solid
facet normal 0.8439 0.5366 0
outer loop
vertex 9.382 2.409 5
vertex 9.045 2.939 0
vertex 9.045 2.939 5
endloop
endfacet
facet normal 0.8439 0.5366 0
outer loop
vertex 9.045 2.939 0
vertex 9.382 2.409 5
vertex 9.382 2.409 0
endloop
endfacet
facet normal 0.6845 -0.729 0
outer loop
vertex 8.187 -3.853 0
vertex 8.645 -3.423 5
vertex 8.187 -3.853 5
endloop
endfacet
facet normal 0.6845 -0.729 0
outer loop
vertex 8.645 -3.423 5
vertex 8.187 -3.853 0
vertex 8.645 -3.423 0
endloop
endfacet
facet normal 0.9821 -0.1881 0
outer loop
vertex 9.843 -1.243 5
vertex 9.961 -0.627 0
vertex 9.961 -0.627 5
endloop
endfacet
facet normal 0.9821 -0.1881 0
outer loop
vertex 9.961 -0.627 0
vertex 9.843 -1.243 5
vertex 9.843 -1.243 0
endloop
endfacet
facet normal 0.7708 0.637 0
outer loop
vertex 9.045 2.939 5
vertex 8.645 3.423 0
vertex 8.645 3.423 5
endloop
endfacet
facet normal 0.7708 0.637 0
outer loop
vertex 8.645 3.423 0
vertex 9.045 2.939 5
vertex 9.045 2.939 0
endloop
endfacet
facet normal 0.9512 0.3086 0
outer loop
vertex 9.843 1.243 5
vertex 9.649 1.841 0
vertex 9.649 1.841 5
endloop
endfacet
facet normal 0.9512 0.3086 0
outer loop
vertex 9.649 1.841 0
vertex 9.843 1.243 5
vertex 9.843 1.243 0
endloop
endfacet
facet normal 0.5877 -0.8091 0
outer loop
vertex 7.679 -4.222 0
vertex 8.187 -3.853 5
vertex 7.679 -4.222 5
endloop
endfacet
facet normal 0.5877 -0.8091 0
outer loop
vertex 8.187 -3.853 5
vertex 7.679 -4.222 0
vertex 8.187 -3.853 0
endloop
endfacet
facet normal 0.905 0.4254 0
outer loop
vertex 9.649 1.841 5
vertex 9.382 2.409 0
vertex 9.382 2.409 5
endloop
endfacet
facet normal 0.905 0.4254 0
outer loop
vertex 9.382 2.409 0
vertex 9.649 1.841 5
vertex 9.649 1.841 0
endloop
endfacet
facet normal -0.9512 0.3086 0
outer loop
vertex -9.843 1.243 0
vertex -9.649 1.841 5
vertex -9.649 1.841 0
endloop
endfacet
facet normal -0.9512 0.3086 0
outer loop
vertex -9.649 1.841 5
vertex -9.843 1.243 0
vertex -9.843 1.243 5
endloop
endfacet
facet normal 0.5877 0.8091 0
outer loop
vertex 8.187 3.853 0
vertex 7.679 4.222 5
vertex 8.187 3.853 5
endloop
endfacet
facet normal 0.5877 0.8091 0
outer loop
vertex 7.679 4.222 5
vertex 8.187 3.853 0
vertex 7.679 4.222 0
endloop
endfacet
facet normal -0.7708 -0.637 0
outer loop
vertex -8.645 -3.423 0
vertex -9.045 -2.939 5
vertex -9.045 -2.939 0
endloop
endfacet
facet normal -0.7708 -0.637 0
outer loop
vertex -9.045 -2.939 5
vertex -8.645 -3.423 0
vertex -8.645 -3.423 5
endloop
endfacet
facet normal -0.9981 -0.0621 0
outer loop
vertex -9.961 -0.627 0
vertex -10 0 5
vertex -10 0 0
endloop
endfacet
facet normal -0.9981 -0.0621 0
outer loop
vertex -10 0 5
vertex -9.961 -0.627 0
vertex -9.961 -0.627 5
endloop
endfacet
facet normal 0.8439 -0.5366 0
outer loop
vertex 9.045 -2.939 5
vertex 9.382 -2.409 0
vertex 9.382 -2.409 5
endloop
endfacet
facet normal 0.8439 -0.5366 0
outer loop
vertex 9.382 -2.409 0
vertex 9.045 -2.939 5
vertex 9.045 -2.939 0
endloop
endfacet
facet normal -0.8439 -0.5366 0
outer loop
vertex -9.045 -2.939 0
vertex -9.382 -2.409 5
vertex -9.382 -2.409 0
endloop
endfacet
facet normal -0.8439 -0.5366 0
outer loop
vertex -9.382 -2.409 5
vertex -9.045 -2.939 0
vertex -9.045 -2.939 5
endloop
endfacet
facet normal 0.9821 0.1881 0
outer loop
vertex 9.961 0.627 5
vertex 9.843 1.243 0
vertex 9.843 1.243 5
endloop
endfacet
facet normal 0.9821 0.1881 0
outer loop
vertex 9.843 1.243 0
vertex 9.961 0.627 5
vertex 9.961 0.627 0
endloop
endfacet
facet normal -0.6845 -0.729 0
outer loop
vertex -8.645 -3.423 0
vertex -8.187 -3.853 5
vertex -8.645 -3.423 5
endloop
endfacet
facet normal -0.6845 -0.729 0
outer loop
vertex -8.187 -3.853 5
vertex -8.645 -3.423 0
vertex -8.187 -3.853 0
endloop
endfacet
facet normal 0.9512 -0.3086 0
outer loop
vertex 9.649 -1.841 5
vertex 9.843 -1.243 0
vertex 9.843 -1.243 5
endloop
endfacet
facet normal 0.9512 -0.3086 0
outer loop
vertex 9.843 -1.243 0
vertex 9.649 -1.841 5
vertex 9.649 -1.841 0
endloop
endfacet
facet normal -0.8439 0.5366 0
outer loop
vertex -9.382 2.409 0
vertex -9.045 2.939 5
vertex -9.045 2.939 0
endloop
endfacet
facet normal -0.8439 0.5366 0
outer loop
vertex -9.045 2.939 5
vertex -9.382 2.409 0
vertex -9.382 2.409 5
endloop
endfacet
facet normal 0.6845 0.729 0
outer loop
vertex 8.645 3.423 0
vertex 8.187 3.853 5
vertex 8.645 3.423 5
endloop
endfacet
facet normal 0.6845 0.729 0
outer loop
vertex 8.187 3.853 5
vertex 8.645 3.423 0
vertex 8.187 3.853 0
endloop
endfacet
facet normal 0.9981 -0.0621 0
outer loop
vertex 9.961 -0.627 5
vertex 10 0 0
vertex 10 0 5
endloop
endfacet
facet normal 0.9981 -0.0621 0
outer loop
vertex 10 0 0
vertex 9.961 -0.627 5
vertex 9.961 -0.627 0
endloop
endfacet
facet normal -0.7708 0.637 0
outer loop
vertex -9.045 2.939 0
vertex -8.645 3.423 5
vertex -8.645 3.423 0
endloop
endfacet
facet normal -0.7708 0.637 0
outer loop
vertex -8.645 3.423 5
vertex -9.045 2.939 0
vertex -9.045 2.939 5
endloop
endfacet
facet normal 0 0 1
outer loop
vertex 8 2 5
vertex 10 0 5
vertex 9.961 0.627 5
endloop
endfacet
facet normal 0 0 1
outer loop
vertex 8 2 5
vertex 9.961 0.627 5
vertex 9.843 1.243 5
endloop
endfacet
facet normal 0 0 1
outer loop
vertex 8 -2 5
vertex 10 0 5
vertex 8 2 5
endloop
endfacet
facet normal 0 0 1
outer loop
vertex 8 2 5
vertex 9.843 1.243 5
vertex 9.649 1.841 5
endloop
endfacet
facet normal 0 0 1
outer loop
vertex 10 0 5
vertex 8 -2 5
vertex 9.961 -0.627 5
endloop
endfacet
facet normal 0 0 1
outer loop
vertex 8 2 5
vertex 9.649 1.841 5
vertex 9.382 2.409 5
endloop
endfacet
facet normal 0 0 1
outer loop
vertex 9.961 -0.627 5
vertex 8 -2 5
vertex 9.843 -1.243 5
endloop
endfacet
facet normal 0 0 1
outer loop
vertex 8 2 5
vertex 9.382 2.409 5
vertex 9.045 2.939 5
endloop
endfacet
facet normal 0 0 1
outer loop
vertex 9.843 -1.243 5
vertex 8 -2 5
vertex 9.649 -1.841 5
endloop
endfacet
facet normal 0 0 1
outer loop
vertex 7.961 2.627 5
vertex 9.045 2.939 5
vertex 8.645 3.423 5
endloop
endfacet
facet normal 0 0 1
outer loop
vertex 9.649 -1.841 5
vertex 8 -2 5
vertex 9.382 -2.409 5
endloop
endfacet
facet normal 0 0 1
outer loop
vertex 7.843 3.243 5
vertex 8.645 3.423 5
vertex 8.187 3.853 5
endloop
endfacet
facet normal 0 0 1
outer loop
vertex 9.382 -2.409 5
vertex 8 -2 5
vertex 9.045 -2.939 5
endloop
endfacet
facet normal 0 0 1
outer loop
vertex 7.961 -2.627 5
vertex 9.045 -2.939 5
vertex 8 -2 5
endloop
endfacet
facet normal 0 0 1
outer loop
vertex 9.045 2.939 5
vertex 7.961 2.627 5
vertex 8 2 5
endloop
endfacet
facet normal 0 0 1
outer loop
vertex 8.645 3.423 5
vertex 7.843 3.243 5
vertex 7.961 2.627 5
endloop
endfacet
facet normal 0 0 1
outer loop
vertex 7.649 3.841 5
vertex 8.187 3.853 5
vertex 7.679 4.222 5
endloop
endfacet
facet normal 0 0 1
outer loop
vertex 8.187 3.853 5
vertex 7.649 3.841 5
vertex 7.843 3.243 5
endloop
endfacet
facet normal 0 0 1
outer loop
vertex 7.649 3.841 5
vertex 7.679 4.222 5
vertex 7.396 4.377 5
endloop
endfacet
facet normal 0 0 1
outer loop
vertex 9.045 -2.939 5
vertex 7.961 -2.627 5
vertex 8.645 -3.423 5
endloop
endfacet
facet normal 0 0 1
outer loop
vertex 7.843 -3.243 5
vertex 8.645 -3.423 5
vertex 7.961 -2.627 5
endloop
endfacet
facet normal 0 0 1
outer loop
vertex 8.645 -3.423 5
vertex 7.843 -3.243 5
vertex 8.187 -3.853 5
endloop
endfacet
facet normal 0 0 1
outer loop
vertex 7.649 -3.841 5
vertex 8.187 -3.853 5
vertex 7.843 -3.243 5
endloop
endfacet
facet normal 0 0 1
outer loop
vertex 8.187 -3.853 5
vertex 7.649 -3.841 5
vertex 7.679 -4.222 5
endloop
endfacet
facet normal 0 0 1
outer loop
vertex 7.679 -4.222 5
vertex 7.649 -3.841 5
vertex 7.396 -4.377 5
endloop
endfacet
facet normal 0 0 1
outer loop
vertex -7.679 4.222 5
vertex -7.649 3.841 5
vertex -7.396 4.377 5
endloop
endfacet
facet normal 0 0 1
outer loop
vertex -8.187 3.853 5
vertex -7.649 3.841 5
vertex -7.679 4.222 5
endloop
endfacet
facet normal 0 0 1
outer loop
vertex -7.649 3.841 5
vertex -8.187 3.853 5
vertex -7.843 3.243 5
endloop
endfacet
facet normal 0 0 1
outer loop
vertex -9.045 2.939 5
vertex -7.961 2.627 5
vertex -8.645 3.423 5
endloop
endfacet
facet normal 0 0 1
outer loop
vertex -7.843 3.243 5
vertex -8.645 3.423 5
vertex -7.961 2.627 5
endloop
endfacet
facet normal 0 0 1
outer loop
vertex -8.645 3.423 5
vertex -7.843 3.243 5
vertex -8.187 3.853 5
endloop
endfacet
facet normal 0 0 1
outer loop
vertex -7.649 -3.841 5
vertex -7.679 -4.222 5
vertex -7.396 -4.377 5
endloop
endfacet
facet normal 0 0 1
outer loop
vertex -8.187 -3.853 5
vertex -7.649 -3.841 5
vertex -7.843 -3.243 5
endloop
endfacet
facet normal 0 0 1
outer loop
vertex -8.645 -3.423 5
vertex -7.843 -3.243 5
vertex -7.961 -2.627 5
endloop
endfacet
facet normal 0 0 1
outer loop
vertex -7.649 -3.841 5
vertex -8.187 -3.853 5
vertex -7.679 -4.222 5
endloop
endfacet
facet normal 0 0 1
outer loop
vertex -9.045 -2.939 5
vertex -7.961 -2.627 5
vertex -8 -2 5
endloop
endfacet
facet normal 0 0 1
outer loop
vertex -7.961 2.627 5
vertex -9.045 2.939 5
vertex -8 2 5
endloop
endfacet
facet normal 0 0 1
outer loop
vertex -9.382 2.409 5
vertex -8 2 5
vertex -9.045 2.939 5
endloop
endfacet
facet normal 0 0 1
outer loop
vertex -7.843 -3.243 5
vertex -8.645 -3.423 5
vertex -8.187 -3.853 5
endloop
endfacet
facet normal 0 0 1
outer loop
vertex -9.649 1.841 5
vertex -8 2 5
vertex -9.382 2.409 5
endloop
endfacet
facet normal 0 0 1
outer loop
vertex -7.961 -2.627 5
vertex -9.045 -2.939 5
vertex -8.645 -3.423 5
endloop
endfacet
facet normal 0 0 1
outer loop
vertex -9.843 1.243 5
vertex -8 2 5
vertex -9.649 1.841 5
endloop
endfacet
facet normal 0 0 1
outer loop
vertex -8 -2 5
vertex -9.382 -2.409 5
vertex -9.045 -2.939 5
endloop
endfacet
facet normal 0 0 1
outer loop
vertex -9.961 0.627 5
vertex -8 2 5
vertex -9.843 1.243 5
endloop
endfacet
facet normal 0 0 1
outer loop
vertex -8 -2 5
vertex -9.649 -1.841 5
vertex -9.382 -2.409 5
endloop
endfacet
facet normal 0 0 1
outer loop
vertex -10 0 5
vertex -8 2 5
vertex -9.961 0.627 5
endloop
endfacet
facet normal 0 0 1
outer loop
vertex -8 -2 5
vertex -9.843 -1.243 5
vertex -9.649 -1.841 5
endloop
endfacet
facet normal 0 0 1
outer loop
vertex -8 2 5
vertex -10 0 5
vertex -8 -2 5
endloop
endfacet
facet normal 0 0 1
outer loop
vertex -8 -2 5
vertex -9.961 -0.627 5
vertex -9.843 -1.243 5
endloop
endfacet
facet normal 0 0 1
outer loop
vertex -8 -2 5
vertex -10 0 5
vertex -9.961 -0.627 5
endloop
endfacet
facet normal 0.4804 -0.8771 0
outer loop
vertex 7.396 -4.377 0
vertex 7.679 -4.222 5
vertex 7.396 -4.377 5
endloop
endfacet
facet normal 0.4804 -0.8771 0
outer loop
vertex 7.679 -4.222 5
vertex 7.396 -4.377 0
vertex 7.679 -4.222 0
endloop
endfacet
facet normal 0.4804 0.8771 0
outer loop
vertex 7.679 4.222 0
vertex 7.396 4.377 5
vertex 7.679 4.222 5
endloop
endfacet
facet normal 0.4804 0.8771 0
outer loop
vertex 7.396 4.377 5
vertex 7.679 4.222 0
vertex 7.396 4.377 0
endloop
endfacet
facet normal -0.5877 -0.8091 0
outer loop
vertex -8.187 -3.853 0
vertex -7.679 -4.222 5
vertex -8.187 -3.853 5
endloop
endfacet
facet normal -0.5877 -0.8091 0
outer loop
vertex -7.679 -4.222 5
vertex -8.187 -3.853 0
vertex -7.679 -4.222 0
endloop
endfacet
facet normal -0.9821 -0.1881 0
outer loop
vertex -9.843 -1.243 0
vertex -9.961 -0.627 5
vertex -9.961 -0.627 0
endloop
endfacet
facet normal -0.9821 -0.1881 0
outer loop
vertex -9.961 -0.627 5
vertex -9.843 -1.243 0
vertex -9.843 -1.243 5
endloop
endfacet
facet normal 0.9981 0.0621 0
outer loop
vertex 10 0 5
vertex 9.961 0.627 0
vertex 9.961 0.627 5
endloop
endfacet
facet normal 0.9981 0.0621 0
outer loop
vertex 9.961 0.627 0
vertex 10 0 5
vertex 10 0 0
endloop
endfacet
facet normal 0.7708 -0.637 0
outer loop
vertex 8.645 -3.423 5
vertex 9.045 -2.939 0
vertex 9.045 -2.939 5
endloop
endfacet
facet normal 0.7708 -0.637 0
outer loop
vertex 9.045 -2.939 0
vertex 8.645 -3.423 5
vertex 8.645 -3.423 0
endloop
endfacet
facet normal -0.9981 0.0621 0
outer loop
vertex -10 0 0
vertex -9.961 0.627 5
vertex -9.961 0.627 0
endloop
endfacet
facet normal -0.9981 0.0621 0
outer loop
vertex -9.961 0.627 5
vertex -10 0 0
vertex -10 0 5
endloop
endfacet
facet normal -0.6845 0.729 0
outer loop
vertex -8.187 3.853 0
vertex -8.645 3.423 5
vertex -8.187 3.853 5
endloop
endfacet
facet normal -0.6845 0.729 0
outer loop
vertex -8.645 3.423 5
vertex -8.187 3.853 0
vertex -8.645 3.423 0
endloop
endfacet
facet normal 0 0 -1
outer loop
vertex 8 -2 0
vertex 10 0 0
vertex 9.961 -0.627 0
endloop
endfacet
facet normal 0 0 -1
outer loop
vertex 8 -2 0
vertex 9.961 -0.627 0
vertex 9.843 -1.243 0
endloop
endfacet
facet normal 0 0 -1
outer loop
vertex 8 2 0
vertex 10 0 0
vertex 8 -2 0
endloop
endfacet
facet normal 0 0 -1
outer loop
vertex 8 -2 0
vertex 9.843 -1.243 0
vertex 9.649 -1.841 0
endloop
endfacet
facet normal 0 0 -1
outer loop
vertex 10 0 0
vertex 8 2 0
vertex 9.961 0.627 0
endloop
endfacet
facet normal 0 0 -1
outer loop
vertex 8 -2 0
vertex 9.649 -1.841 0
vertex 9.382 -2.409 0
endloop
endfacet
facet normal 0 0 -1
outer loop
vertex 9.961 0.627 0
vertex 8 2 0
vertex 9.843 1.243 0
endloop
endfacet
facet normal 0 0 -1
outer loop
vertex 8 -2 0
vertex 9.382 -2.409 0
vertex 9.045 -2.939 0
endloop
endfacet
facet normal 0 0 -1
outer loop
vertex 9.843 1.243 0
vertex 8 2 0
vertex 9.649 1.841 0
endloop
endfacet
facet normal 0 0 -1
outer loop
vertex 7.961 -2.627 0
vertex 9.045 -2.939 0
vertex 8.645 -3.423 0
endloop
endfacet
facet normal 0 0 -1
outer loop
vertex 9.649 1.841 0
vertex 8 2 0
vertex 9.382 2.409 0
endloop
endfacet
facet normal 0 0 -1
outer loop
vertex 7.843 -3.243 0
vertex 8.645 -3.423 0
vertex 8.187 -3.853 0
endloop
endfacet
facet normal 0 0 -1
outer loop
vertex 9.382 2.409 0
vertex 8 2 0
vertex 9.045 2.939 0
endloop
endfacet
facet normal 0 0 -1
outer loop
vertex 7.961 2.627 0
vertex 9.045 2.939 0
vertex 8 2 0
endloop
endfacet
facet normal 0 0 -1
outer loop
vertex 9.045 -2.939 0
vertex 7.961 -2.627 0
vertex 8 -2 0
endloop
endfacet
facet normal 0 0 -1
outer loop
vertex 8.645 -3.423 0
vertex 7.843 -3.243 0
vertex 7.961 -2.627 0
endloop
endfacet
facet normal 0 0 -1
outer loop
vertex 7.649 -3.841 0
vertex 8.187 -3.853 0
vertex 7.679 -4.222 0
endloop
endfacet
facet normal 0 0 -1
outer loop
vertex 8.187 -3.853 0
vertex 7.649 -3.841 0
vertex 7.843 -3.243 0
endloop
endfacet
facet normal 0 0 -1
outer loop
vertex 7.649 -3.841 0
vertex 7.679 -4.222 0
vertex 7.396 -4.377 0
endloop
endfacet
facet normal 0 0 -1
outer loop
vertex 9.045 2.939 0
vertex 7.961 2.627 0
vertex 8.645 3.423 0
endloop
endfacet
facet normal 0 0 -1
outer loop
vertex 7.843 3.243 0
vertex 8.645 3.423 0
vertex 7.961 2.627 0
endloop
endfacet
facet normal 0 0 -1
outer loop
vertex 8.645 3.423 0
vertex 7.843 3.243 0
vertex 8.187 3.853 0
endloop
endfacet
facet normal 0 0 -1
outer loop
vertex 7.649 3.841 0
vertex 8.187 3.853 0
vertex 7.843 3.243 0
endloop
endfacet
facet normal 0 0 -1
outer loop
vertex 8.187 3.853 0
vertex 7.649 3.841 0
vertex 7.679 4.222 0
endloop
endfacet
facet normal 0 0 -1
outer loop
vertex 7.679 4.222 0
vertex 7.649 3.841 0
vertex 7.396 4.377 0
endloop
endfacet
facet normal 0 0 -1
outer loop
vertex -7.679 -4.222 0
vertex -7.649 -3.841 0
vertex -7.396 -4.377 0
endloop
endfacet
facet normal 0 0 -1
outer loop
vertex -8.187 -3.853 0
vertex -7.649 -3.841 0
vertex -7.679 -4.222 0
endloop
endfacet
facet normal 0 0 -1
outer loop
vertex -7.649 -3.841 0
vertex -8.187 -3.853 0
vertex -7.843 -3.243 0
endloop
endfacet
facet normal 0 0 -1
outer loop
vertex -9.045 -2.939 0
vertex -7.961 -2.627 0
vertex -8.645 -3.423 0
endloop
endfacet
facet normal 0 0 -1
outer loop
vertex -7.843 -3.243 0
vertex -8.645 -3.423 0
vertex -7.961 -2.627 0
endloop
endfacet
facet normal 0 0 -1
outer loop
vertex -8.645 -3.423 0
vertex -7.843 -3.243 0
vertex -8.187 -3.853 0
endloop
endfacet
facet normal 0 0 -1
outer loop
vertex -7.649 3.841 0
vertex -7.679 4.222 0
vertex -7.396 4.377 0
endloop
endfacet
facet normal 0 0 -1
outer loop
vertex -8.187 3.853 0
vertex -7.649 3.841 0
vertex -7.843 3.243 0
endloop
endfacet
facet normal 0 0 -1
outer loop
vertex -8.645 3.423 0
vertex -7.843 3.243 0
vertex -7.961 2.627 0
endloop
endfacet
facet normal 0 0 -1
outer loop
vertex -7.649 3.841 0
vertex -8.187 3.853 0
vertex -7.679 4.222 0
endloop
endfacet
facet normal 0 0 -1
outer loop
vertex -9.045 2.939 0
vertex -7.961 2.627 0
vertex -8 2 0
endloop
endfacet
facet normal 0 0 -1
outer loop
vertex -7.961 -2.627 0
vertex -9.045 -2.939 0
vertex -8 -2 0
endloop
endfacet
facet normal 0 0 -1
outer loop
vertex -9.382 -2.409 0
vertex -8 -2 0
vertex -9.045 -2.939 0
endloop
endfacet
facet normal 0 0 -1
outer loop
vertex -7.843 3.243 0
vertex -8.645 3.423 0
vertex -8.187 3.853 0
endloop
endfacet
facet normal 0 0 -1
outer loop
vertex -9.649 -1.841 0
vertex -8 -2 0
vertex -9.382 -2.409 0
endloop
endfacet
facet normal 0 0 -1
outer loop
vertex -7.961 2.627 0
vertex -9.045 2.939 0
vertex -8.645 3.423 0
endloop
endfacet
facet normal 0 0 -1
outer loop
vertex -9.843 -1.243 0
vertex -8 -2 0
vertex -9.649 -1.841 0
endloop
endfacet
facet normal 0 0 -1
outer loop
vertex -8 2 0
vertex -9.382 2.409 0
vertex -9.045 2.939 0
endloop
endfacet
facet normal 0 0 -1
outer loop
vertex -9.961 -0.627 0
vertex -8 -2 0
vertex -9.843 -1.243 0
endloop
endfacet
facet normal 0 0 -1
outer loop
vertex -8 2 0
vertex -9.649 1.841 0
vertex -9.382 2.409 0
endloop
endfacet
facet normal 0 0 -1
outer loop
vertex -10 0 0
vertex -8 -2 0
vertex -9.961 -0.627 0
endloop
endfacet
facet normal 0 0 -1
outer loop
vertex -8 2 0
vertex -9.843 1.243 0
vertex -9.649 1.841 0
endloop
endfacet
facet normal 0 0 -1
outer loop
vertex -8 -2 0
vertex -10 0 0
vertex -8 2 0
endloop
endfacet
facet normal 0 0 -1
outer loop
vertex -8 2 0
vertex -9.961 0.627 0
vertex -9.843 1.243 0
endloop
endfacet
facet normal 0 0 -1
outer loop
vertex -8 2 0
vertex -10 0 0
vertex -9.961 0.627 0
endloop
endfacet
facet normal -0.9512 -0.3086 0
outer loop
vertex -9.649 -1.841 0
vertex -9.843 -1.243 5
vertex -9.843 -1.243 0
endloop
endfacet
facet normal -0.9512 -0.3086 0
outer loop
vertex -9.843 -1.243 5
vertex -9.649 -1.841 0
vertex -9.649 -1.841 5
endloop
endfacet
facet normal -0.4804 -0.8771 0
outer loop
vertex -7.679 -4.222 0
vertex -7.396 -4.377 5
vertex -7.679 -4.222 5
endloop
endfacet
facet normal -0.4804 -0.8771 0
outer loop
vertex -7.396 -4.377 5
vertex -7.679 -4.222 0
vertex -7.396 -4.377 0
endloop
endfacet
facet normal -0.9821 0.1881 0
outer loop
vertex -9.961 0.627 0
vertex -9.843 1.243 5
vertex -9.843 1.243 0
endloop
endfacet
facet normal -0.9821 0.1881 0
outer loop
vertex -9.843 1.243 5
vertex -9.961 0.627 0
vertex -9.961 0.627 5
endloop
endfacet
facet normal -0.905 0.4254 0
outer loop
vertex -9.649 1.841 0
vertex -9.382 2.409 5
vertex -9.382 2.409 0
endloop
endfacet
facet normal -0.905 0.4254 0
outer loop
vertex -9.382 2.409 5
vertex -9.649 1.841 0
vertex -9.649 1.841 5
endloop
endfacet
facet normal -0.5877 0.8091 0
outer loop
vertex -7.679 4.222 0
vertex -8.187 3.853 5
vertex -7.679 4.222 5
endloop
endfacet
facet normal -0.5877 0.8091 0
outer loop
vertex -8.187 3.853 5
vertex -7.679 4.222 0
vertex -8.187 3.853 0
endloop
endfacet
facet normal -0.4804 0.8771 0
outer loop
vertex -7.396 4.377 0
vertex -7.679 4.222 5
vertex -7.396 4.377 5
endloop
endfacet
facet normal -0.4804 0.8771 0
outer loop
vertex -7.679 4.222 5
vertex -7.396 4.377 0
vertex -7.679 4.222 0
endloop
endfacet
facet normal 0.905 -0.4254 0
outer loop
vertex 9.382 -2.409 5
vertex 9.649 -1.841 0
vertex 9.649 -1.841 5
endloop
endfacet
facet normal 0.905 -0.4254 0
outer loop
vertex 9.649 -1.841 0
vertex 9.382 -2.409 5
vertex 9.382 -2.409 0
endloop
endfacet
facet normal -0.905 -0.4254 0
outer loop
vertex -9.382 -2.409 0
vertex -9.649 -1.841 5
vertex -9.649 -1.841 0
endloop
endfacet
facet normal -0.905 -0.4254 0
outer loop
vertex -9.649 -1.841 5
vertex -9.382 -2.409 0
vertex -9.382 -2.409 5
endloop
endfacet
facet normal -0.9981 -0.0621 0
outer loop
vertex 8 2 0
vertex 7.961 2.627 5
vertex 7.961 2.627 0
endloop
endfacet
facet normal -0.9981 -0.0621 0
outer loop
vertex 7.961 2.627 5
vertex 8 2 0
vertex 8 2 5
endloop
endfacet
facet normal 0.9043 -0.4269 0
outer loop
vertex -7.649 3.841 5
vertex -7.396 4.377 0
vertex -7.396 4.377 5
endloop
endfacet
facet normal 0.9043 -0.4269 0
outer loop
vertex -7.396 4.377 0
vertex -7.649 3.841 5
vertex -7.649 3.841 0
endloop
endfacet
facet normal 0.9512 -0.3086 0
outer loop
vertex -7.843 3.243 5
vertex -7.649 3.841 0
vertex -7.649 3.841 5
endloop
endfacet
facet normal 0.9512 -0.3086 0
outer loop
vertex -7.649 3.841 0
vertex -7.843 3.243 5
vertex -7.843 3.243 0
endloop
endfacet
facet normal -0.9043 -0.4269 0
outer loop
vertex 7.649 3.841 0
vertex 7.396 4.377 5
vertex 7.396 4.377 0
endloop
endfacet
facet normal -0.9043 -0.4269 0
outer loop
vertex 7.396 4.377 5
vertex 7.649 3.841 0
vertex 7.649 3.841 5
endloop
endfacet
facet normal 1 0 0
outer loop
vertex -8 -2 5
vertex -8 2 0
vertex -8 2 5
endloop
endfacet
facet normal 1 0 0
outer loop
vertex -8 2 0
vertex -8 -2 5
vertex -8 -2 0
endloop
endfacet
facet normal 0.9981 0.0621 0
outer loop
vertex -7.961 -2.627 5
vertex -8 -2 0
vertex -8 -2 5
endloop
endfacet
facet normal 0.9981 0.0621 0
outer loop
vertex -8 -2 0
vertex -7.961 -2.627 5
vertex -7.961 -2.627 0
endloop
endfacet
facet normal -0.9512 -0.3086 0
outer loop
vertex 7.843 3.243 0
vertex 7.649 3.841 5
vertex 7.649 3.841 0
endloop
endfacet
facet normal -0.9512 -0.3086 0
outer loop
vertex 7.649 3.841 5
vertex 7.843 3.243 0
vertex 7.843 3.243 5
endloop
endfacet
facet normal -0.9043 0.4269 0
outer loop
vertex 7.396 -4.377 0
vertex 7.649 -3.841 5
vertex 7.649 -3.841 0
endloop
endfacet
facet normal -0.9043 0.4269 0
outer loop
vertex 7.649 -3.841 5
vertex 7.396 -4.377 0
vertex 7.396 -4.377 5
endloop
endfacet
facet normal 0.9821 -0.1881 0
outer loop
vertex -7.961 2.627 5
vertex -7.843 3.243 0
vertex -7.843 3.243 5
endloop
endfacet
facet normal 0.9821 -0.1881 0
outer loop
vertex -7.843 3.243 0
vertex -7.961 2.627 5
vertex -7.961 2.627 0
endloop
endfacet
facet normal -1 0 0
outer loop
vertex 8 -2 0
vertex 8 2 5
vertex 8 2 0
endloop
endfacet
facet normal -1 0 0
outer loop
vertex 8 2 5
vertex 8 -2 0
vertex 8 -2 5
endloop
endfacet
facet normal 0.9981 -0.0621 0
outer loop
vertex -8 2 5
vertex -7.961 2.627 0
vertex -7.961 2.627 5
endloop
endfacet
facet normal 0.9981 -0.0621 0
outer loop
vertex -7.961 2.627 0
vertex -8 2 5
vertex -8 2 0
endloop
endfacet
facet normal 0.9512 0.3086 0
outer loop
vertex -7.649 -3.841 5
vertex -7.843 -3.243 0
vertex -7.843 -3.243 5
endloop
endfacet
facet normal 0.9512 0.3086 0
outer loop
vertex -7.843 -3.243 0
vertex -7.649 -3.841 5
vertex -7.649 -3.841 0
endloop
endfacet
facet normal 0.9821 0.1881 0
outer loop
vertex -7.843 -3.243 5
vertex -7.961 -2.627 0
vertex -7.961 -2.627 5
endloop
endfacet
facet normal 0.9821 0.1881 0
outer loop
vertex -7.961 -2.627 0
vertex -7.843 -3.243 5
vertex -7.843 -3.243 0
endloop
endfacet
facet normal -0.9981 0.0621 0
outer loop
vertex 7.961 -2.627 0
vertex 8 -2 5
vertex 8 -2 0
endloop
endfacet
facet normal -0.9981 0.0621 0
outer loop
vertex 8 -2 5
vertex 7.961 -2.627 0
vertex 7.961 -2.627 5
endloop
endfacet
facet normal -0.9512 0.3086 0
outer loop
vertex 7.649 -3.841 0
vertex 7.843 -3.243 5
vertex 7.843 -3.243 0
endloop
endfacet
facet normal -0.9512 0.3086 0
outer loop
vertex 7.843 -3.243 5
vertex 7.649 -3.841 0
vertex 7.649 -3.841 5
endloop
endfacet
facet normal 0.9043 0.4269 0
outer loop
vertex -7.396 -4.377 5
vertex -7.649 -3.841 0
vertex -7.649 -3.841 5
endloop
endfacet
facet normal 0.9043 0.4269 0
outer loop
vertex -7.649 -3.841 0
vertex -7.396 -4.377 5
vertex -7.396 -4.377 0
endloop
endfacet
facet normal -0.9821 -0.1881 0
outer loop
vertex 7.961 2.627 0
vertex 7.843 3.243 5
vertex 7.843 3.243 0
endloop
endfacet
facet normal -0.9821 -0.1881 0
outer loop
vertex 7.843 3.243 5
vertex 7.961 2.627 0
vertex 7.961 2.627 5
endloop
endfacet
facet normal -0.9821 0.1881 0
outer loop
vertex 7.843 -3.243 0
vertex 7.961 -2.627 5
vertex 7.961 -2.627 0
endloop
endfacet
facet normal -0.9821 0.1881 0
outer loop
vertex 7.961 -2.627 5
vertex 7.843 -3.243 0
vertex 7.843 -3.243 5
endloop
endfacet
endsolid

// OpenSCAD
$fn = 50;


difference() {
	union() {
		translate(v = [0, 0, 0]) {
			rotate(a = [0, 0, 0]) {
				difference() {
					union() {
						hull() {
							translate(v = [-5.0000000000, 0.0000000000, 0]) {
								cylinder(h = 5, r = 5);
							}
							translate(v = [5.0000000000, 0.0000000000, 0]) {
								cylinder(h = 5, r = 5);
							}
							translate(v = [-5.0000000000, 0.0000000000, 0]) {
								cylinder(h = 5, r = 5);
							}
							translate(v = [5.0000000000, 0.0000000000, 0]) {
								cylinder(h = 5, r = 5);
							}
						}
					}
					union() {
						hull() {
							translate(v = [-3.0000000000, -2.0000000000, 0]) {
								cylinder(h = 5, r = 5);
							}
							translate(v = [3.0000000000, -2.0000000000, 0]) {
								cylinder(h = 5, r = 5);
							}
							translate(v = [-3.0000000000, 2.0000000000, 0]) {
								cylinder(h = 5, r = 5);
							}
							translate(v = [3.0000000000, 2.0000000000, 0]) {
								cylinder(h = 5, r = 5);
							}
						}
					}
				}
			}
		}
	}
	union();
}
